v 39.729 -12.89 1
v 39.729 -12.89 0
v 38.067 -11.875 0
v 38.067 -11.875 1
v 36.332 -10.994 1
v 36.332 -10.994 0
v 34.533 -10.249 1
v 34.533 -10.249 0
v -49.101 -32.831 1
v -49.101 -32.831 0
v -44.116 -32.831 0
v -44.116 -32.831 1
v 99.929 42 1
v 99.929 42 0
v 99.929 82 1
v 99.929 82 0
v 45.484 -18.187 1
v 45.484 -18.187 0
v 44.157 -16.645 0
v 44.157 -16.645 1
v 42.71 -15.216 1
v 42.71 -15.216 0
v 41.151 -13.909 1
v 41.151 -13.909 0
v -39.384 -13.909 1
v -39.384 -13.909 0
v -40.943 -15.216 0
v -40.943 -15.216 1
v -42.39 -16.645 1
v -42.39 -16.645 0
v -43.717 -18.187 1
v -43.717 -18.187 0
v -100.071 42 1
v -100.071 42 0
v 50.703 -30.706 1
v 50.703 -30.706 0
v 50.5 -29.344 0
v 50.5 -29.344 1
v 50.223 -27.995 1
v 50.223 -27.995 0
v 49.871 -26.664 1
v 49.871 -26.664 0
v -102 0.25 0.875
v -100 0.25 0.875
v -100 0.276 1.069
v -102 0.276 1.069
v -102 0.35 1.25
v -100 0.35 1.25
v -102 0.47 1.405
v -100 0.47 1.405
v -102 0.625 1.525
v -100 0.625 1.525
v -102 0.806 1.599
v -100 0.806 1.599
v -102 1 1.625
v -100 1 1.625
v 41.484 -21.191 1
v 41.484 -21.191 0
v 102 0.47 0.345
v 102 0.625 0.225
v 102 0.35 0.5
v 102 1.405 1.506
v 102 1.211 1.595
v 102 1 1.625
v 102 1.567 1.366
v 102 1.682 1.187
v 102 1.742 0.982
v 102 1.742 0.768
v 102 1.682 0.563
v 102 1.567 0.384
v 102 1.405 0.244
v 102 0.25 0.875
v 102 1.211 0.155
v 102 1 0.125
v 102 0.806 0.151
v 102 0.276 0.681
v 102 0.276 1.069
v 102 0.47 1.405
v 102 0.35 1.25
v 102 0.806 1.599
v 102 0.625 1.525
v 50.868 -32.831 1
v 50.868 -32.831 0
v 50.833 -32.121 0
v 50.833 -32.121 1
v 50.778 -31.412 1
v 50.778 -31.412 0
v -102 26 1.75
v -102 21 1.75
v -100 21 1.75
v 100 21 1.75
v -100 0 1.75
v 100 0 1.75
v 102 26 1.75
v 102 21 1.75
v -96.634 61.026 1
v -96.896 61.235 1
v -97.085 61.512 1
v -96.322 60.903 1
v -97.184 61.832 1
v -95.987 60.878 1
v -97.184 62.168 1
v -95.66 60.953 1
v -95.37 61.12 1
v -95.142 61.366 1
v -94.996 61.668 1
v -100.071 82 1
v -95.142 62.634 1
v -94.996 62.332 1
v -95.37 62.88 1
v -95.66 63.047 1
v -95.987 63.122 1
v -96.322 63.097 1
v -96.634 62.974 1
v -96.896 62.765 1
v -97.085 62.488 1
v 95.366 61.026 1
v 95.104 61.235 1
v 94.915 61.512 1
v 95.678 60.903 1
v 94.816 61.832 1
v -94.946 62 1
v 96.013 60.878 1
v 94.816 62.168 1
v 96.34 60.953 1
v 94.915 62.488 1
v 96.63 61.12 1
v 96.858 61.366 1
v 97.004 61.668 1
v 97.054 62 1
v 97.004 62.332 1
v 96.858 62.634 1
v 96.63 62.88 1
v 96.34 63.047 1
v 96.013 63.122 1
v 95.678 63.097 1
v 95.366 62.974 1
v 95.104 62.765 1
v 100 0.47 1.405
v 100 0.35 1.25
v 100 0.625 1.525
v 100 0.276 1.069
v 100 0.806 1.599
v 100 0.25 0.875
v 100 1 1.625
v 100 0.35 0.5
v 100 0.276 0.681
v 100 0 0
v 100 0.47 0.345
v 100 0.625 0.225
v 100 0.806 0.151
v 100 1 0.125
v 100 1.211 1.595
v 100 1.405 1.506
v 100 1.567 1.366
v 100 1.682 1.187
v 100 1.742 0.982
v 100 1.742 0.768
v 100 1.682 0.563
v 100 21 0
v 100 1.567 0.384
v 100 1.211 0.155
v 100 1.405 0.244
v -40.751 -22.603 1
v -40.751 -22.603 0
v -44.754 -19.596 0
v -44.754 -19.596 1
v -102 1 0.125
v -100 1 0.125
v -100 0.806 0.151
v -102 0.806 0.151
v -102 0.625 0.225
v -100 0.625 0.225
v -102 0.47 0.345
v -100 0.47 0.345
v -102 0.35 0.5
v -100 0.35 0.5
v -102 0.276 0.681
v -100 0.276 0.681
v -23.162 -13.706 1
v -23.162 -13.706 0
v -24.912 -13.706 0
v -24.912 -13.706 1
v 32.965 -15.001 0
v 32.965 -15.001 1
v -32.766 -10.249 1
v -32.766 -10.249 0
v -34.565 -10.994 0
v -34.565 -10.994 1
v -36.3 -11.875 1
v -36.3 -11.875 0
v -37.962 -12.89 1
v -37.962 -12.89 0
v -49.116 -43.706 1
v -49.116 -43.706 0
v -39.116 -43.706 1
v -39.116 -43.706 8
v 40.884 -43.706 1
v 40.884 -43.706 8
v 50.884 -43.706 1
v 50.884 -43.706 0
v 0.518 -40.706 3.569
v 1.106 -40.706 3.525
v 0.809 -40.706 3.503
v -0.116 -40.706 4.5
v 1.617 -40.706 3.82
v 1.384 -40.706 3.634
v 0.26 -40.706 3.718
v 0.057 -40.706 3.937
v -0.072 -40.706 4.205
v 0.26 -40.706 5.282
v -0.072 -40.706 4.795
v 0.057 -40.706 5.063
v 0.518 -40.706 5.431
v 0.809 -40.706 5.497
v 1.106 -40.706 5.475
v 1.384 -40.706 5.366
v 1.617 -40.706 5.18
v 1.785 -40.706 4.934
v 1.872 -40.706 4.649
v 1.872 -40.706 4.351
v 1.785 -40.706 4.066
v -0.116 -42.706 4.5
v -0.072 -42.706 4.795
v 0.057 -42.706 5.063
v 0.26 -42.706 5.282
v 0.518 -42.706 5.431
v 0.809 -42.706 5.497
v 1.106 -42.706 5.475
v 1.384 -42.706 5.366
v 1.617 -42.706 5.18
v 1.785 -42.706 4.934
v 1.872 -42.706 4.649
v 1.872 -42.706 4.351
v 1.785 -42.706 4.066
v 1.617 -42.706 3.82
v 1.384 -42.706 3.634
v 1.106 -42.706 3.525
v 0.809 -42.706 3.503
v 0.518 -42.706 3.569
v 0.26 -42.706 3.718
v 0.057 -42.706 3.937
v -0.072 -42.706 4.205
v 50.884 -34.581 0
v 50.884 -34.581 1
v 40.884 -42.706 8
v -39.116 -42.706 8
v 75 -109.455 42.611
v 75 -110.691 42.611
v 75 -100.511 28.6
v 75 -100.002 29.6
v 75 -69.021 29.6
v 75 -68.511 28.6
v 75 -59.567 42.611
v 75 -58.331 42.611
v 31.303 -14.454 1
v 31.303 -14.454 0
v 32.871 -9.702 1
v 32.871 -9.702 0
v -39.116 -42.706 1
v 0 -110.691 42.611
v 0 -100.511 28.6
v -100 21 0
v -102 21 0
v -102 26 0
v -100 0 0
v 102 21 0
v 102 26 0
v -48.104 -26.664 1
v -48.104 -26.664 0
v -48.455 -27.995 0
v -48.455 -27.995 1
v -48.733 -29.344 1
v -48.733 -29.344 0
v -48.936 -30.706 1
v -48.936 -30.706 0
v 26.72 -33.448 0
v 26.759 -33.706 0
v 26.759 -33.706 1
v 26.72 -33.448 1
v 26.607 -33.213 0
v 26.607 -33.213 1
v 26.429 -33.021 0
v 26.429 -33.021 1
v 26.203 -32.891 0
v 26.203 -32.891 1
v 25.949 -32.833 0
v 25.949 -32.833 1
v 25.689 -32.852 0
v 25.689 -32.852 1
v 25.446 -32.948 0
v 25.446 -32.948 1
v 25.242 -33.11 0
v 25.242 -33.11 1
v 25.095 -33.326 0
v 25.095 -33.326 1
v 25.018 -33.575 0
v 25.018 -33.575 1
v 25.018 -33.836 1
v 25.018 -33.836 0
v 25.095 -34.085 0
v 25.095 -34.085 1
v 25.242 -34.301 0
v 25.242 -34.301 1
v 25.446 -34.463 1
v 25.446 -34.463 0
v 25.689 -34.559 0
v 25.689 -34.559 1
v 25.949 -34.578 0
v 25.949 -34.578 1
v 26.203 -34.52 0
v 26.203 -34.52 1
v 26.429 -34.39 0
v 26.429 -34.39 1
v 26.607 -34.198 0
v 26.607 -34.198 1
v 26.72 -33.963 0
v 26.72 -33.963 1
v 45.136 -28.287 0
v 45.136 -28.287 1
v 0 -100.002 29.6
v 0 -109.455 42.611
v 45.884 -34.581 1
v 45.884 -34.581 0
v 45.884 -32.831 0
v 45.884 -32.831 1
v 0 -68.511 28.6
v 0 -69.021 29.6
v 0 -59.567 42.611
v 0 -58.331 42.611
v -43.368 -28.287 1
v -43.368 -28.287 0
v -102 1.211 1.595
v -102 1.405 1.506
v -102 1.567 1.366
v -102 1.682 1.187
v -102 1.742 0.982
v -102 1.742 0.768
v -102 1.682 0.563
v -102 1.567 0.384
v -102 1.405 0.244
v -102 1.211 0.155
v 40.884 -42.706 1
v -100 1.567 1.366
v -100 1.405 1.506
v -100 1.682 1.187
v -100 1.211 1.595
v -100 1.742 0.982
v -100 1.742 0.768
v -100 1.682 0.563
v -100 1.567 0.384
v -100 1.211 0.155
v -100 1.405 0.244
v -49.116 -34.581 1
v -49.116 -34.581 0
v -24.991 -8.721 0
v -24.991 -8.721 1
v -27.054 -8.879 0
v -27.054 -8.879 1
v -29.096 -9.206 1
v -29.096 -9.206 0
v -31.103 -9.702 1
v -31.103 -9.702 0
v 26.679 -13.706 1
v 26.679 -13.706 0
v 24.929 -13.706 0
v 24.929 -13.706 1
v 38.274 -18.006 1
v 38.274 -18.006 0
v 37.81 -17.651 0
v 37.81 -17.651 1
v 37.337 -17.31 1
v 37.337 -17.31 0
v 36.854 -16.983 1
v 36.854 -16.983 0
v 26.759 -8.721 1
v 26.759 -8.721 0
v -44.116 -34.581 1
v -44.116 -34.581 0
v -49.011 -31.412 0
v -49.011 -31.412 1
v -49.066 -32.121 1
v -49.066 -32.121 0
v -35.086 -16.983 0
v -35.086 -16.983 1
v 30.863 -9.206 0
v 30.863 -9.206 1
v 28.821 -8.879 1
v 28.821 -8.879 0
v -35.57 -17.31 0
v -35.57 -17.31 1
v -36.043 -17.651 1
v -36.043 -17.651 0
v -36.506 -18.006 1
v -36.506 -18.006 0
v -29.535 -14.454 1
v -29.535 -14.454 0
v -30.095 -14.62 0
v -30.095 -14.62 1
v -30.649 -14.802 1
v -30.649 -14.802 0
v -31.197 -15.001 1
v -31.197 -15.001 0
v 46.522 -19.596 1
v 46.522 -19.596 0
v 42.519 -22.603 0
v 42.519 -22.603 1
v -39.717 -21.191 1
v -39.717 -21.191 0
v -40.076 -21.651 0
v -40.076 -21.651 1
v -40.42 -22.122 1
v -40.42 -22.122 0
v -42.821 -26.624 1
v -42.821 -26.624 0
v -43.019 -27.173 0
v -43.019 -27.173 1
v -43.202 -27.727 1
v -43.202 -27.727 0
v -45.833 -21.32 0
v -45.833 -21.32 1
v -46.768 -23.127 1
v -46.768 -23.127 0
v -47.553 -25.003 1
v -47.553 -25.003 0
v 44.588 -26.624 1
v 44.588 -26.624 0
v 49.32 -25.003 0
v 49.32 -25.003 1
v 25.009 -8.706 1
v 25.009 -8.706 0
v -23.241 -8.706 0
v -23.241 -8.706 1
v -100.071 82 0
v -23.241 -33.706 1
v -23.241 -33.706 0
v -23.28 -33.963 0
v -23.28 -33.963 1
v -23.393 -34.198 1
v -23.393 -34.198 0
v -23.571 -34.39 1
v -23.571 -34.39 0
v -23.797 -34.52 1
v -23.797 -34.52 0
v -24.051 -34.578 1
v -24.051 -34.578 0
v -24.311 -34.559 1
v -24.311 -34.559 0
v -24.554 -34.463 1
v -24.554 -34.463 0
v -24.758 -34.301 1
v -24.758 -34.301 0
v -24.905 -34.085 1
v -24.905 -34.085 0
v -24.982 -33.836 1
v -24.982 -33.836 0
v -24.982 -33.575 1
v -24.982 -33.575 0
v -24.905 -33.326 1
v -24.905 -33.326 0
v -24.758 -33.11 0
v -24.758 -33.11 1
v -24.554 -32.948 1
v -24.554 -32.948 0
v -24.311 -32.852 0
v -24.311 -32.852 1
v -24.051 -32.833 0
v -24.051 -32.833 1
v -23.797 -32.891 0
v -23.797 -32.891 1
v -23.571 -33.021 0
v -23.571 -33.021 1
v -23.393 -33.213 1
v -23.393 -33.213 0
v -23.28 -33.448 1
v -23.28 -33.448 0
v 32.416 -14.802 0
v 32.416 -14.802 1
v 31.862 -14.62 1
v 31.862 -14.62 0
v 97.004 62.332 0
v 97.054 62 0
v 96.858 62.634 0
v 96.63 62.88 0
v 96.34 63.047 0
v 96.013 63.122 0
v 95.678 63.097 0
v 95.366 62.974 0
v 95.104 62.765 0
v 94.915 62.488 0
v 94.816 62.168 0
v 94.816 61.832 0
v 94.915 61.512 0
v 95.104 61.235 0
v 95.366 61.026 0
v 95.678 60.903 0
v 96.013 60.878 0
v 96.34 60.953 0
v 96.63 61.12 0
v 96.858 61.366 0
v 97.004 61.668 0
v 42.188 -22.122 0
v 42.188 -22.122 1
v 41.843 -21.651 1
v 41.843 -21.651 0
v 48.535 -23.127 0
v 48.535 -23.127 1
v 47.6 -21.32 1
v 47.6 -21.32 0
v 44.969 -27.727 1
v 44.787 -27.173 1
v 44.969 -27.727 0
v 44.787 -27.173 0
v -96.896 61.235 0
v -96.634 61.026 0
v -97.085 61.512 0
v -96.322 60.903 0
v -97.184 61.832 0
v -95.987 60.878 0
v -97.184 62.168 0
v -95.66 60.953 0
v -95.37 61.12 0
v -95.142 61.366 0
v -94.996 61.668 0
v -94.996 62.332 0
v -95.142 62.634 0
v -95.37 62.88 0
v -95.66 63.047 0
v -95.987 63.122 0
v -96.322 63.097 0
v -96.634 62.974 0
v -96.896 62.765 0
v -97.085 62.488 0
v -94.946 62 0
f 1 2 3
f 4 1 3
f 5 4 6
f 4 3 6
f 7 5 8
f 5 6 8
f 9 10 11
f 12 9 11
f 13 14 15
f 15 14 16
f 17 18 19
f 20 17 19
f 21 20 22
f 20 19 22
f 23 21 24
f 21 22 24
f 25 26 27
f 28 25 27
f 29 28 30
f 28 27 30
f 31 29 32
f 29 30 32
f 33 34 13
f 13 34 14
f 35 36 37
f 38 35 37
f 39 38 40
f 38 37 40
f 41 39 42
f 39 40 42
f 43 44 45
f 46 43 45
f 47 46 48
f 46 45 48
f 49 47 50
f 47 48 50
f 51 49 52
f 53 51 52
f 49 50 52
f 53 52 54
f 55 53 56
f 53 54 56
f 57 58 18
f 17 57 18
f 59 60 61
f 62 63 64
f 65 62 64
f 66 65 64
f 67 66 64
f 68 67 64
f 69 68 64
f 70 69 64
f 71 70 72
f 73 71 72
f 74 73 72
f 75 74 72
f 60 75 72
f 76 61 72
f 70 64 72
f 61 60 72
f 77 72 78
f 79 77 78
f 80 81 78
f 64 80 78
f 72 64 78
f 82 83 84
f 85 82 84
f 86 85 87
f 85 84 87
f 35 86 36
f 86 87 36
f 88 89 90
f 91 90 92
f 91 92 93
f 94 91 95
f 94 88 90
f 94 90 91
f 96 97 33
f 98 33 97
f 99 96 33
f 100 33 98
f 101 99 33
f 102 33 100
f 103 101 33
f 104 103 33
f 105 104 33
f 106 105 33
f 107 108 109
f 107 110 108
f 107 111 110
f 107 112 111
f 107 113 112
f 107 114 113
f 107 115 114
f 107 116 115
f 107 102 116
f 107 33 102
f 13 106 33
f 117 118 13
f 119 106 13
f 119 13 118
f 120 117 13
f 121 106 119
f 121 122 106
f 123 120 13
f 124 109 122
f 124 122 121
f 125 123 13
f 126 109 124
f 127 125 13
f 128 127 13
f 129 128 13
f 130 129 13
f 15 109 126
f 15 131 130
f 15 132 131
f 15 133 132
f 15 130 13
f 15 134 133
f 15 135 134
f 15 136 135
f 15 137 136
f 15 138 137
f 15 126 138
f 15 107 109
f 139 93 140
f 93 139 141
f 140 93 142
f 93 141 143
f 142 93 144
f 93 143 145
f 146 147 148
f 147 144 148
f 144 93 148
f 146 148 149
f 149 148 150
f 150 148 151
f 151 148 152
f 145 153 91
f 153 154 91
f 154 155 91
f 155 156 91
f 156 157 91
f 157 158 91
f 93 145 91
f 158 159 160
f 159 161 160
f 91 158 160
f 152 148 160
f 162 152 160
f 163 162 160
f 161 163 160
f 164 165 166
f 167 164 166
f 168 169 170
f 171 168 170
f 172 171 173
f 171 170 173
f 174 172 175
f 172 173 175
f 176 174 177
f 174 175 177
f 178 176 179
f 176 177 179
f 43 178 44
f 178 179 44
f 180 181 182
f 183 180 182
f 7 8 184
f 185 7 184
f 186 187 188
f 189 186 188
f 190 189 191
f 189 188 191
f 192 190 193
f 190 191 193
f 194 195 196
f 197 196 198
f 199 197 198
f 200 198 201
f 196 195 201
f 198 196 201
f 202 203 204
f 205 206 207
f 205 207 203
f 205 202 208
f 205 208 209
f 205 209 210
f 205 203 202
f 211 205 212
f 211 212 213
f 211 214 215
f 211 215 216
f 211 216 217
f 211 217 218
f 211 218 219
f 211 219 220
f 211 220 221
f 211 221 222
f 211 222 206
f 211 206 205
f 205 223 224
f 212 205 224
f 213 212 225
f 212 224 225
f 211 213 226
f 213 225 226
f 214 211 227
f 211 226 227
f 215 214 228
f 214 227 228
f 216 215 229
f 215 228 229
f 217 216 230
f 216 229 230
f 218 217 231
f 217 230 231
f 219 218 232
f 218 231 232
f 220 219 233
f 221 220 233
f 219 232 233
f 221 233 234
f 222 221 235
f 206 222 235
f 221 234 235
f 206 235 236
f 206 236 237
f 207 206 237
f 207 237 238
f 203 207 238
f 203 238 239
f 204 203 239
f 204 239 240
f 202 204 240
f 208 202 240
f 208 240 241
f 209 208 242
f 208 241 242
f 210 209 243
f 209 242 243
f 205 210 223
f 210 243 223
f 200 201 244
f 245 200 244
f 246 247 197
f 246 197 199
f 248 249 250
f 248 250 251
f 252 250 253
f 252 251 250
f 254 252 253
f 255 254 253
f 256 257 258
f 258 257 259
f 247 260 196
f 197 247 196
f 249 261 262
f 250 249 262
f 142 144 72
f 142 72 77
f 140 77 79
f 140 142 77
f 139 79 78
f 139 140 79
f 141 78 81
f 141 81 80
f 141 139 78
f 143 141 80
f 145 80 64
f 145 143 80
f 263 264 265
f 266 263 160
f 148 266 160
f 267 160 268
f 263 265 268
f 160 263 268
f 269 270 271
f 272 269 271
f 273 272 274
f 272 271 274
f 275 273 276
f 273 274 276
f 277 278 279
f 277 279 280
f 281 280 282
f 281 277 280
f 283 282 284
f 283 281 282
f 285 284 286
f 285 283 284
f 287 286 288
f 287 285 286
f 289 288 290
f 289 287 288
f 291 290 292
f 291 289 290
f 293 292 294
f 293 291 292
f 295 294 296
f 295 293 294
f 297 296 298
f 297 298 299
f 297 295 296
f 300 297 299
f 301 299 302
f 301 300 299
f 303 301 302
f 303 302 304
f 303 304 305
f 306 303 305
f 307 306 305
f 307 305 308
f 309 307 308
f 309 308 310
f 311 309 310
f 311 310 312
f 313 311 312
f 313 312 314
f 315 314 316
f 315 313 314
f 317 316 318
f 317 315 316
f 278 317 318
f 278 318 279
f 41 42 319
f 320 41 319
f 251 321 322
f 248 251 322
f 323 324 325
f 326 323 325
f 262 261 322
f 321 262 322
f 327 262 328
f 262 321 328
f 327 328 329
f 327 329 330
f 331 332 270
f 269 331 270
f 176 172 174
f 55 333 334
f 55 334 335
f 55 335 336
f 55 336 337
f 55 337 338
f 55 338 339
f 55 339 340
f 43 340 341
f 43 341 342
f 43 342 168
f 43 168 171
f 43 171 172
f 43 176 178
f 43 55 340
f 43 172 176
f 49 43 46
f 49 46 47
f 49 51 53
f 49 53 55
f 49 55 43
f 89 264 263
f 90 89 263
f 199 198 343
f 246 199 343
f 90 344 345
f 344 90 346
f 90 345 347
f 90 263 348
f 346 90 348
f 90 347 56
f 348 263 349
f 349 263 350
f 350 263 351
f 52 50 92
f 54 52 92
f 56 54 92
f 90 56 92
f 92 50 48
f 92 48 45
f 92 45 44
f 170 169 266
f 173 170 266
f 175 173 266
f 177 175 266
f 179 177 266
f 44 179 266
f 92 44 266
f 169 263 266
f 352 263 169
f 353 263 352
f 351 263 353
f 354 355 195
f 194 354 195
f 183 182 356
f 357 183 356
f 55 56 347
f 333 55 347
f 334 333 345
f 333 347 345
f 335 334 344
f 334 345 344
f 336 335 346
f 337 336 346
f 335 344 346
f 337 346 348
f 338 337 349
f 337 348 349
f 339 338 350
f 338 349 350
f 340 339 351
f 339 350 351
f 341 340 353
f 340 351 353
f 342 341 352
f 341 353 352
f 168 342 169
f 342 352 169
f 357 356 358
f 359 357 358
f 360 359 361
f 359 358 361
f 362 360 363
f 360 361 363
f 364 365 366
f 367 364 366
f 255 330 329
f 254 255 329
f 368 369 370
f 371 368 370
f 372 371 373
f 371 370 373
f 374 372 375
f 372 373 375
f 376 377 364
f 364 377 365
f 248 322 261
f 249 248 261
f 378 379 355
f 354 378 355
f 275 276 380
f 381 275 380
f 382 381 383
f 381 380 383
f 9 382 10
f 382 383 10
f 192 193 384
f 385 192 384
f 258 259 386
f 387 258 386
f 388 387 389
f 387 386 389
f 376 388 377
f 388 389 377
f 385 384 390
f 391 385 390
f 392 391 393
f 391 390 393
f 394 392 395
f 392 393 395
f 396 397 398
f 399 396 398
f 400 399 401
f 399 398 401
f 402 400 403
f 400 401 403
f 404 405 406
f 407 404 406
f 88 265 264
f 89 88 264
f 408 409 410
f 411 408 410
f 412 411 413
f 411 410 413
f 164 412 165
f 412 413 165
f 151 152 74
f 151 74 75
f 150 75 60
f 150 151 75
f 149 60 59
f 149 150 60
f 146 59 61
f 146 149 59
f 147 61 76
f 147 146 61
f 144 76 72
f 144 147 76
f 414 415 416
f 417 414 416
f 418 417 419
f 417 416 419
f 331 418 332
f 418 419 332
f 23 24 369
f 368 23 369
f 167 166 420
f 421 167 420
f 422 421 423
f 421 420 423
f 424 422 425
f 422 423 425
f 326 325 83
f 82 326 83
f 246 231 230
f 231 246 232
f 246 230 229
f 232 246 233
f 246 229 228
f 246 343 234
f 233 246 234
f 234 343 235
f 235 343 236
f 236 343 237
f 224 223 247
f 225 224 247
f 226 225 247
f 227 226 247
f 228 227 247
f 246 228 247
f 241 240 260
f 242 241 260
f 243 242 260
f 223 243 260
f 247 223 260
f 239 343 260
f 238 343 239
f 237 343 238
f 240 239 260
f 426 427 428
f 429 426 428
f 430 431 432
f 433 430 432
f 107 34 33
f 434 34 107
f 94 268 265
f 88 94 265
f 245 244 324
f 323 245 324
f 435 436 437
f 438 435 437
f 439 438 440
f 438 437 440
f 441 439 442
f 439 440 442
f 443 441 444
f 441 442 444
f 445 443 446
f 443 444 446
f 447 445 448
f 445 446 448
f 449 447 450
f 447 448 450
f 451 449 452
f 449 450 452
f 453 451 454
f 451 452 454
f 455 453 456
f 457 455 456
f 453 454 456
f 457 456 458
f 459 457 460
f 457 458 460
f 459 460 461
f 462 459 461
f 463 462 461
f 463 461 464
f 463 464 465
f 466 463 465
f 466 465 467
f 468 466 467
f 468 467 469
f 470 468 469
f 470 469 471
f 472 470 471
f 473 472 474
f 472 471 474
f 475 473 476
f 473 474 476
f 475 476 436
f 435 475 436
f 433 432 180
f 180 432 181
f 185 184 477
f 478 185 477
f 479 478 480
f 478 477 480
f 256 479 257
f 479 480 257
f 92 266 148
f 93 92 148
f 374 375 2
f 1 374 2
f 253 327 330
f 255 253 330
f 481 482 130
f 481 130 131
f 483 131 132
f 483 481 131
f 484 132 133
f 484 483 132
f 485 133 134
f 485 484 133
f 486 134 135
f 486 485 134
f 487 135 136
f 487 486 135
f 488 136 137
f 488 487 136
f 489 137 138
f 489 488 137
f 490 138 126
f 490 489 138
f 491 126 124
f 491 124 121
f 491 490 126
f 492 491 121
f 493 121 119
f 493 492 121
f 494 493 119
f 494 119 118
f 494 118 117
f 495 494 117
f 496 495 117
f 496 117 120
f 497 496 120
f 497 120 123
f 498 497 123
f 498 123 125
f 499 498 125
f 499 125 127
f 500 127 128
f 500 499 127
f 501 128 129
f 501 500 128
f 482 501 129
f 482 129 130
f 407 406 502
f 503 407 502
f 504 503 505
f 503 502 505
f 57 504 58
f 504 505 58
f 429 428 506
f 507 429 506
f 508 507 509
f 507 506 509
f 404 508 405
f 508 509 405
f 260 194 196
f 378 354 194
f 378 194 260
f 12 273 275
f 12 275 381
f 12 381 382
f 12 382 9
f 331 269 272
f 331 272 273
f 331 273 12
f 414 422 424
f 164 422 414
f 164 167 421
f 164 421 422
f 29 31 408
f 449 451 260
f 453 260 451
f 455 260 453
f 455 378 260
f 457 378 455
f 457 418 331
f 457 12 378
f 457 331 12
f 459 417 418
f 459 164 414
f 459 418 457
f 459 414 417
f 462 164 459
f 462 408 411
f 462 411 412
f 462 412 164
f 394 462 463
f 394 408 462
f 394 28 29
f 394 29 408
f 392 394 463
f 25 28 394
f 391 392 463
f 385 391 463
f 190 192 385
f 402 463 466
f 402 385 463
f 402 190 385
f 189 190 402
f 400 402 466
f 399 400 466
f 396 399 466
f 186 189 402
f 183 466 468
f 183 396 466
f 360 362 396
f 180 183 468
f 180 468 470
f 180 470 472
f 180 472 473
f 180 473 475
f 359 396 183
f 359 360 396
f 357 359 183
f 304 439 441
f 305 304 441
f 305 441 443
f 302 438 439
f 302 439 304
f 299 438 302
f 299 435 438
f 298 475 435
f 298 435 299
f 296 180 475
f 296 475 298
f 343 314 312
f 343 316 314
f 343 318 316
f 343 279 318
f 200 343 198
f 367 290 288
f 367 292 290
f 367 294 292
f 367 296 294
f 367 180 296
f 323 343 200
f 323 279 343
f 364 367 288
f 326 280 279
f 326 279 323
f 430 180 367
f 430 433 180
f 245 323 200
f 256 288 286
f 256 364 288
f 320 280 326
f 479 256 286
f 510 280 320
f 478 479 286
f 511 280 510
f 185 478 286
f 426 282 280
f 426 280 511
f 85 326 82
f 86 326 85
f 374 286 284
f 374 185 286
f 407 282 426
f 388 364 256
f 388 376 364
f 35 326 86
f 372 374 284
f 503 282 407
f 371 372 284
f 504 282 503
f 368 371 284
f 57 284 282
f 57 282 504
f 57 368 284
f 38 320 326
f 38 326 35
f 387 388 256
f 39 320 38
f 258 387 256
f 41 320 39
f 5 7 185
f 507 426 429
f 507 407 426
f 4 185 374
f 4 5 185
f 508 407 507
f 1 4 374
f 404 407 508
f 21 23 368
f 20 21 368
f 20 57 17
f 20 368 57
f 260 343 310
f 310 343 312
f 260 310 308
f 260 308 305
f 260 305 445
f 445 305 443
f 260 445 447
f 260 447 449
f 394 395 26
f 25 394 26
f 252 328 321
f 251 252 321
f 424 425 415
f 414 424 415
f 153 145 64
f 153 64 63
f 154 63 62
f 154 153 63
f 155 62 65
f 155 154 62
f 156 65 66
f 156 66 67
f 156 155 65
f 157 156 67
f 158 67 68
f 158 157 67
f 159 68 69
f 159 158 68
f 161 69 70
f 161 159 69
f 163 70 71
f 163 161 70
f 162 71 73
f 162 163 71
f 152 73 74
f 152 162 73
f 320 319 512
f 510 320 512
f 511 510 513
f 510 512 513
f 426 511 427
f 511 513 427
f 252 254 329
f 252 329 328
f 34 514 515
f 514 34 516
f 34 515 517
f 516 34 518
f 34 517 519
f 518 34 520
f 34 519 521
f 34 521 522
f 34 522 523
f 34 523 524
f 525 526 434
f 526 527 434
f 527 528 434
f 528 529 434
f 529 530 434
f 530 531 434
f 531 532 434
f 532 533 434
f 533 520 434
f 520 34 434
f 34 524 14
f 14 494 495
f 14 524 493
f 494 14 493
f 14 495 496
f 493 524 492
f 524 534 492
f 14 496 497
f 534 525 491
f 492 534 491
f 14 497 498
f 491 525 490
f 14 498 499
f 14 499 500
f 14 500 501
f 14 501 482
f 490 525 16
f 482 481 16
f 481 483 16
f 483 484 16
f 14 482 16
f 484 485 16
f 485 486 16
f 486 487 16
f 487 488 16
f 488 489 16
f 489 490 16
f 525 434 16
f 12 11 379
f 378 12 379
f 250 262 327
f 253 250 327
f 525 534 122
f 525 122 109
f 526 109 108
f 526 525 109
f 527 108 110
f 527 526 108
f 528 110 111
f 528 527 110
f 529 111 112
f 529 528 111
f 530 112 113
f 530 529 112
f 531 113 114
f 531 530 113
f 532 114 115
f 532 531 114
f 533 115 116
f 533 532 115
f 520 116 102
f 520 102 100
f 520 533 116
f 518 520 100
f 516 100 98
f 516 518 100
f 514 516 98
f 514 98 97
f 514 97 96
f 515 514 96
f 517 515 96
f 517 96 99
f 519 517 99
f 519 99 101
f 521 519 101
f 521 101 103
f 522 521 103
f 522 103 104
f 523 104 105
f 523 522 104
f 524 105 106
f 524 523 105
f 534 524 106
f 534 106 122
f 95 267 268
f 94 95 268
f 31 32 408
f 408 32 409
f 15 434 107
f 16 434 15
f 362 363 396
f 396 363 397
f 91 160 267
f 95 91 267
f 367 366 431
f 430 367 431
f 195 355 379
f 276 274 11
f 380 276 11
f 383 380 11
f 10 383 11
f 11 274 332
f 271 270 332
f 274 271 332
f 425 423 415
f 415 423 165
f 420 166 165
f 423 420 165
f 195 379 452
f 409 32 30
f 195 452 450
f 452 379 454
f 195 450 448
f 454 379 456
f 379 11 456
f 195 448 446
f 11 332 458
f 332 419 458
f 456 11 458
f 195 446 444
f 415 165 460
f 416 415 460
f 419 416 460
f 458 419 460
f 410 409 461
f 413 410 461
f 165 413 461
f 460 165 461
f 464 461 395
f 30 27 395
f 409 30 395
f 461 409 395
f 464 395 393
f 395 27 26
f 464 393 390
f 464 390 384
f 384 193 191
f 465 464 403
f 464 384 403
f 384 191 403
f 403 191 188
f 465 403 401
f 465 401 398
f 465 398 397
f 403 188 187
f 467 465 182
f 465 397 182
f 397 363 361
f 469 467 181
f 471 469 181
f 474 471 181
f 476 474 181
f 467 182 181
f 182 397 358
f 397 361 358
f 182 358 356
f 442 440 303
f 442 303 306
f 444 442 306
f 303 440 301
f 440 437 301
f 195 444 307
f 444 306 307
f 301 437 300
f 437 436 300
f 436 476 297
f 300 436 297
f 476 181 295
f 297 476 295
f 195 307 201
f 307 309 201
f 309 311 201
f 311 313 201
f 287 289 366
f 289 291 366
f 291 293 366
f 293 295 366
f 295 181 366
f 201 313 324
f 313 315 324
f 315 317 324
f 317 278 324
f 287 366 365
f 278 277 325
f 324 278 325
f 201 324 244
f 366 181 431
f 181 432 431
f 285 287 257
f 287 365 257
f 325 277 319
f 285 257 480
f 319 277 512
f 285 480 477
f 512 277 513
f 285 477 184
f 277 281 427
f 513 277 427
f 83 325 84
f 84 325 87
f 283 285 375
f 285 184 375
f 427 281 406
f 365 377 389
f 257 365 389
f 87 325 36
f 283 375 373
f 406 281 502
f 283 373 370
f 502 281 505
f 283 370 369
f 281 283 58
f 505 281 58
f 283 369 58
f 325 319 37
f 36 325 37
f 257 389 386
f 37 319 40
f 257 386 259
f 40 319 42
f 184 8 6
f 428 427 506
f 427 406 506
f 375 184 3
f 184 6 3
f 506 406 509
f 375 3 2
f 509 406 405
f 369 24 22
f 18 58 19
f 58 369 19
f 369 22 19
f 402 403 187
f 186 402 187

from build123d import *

# Parameters (mm, degrees)
F1_R      = 0.875
F2_DEPTH  = 1
F3_DEPTH  = 1.75
F4_DEPTH  = 8
F5_R      = 1
F6_DEPTH  = 2
F7_W      = 200
F7_H      = 40
F7_R      = 1.125
F8_DEPTH  = 1
F10_DEPTH = 2
F11_DEPTH = 202
F13_DEPTH = 75


with BuildPart() as f2:
    # F1 (on Top) → F2 (new body)
    with BuildSketch(Plane.XY):
        with BuildLine():
            Line((0.8836236666, -30.7055586278), (0.8836236666, -33.7055586278))
            Line((0.8836236666, -33.7055586278), (0.8836236666, -42.7055586278))
            Line((0.8836236666, -42.7055586278), (40.8836236666, -42.7055586278))
            Line((40.8836236666, -42.7055586278), (40.8836236666, -43.7055586278))
            Line((40.8836236666, -43.7055586278), (50.8836236666, -43.7055586278))
            Line((50.8836236666, -43.7055586278), (50.8836236666, -34.5805586278))
            Line((50.8836236666, -34.5805586278), (45.8836236666, -34.5805586278))
            Line((45.8836236666, -34.5805586278), (45.8836236666, -32.8305586278))
            Line((45.8836236666, -32.8305586278), (50.8683064743, -32.8305586278))
            ThreePointArc((50.8683064743, -32.8305586278), (50.8082953754, -31.7662958277), (50.7029709586, -30.7055586278))
            Line((50.7029709586, -30.7055586278), (25.8836236666, -30.7055586278))
            Line((25.8836236666, -30.7055586278), (20.8836236666, -30.7055586278))
            Line((20.8836236666, -30.7055586278), (0.8836236666, -30.7055586278))
        make_face()
        with Locations((25.8836236666, -33.7055586278)):
            Circle(F1_R, mode=Mode.SUBTRACT)
        with BuildLine():
            Line((-9.8663763334, -33.7055586278), (0.8836236666, -33.7055586278))
            Line((0.8836236666, -33.7055586278), (0.8836236666, -30.7055586278))
            Line((0.8836236666, -30.7055586278), (-19.1163763334, -30.7055586278))
            Line((-19.1163763334, -30.7055586278), (-24.1163763334, -30.7055586278))
            Line((-24.1163763334, -30.7055586278), (-48.9357236254, -30.7055586278))
            ThreePointArc((-48.9357236254, -30.7055586278), (-49.0410480422, -31.7662958277), (-49.1010591411, -32.8305586278))
            Line((-49.1010591411, -32.8305586278), (-44.1163763334, -32.8305586278))
            Line((-44.1163763334, -32.8305586278), (-44.1163763334, -33.7055586278))
            Line((-44.1163763334, -33.7055586278), (-24.9913763334, -33.7055586278))
            ThreePointArc((-24.9913763334, -33.7055586278), (-24.1163763334, -32.8305586278), (-23.2413763334, -33.7055586278))
            Line((-23.2413763334, -33.7055586278), (-9.8663763334, -33.7055586278))
        make_face()
        with BuildLine():
            Line((0.8836236666, -42.7055586278), (0.8836236666, -33.7055586278))
            Line((0.8836236666, -33.7055586278), (-9.8663763334, -33.7055586278))
            Line((-9.8663763334, -33.7055586278), (-23.2413763334, -33.7055586278))
            ThreePointArc((-23.2413763334, -33.7055586278), (-24.1163763334, -34.5805586278), (-24.9913763334, -33.7055586278))
            Line((-24.9913763334, -33.7055586278), (-44.1163763334, -33.7055586278))
            Line((-44.1163763334, -33.7055586278), (-44.1163763334, -34.5805586278))
            Line((-44.1163763334, -34.5805586278), (-49.1163763334, -34.5805586278))
            Line((-49.1163763334, -34.5805586278), (-49.1163763334, -43.7055586278))
            Line((-49.1163763334, -43.7055586278), (-39.1163763334, -43.7055586278))
            Line((-39.1163763334, -43.7055586278), (-39.1163763334, -42.7055586278))
            Line((-39.1163763334, -42.7055586278), (0.8836236666, -42.7055586278))
        make_face()
        with BuildLine():
            Line((-19.1163763334, -30.7055586278), (0.8836236666, -30.7055586278))
            Line((0.8836236666, -30.7055586278), (0.8836236666, -8.7055586278))
            Line((0.8836236666, -8.7055586278), (-23.2413763334, -8.7055586278))
            Line((-23.2413763334, -8.7055586278), (-23.1618389561, -13.7055586278))
            Line((-23.1618389561, -13.7055586278), (-24.1163763334, -13.7055586278))
            Line((-24.1163763334, -13.7055586278), (-24.912082614, -13.7055586278))
            Line((-24.912082614, -13.7055586278), (-24.9913763334, -8.7208758202))
            ThreePointArc((-24.9913763334, -8.7208758202), (-28.077908395, -9.0214288331), (-31.1034834927, -9.701801973))
            Line((-31.1034834927, -9.701801973), (-29.5353038107, -14.4536697596))
            ThreePointArc((-29.5353038107, -14.4536697596), (-30.3723855414, -14.7091813735), (-31.1974871395, -15.0010706704))
            Line((-31.1974871395, -15.0010706704), (-32.7655987712, -10.2494090883))
            ThreePointArc((-32.7655987712, -10.2494090883), (-35.440866625, -11.4175367409), (-37.9617303934, -12.8895510627))
            Line((-37.9617303934, -12.8895510627), (-35.0863486412, -16.9825293698))
            ThreePointArc((-35.0863486412, -16.9825293698), (-35.8075280429, -17.4785141741), (-36.5063159472, -18.0055778519))
            Line((-36.5063159472, -18.0055778519), (-39.3841000729, -13.9091798727))
            ThreePointArc((-39.3841000729, -13.9091798727), (-41.6810511869, -15.9156121048), (-43.7165906252, -18.1868086874))
            Line((-43.7165906252, -18.1868086874), (-39.7171402185, -21.1909205507))
            ThreePointArc((-39.7171402185, -21.1909205507), (-40.2497548544, -21.8854868219), (-40.7514700108, -22.6026915051))
            Line((-40.7514700108, -22.6026915051), (-44.7542619472, -19.5960697147))
            ThreePointArc((-44.7542619472, -19.5960697147), (-46.318770614, -22.214097093), (-47.5528453195, -25.0031496818))
            Line((-47.5528453195, -25.0031496818), (-42.8208203298, -26.6243317012))
            ThreePointArc((-42.8208203298, -26.6243317012), (-43.1127341685, -27.4494904535), (-43.3682652017, -28.2866311505))
            Line((-43.3682652017, -28.2866311505), (-48.1042437851, -26.664094638))
            ThreePointArc((-48.1042437851, -26.664094638), (-48.6035037794, -28.6676434394), (-48.9357236254, -30.7055586278))
            Line((-48.9357236254, -30.7055586278), (-24.1163763334, -30.7055586278))
            Line((-24.1163763334, -30.7055586278), (-19.1163763334, -30.7055586278))
        make_face()
        with BuildLine():
            Line((0.8836236666, -8.7055586278), (0.8836236666, -30.7055586278))
            Line((0.8836236666, -30.7055586278), (20.8836236666, -30.7055586278))
            Line((20.8836236666, -30.7055586278), (25.8836236666, -30.7055586278))
            Line((25.8836236666, -30.7055586278), (50.7029709586, -30.7055586278))
            ThreePointArc((50.7029709586, -30.7055586278), (50.3707511125, -28.6676434394), (49.8714911183, -26.664094638))
            Line((49.8714911183, -26.664094638), (45.1355125348, -28.2866311505))
            ThreePointArc((45.1355125348, -28.2866311505), (44.8799815016, -27.4494904535), (44.588067663, -26.6243317012))
            Line((44.588067663, -26.6243317012), (49.3200926527, -25.0031496818))
            ThreePointArc((49.3200926527, -25.0031496818), (48.0860179472, -22.214097093), (46.5215092804, -19.5960697147))
            Line((46.5215092804, -19.5960697147), (42.518717344, -22.6026915051))
            ThreePointArc((42.518717344, -22.6026915051), (42.0170021876, -21.8854868219), (41.4843875517, -21.1909205507))
            Line((41.4843875517, -21.1909205507), (45.4838379584, -18.1868086874))
            ThreePointArc((45.4838379584, -18.1868086874), (43.4482985201, -15.9156121048), (41.1513474061, -13.9091798727))
            Line((41.1513474061, -13.9091798727), (38.2735632804, -18.0055778519))
            ThreePointArc((38.2735632804, -18.0055778519), (37.5747753761, -17.4785141741), (36.8535959744, -16.9825293698))
            Line((36.8535959744, -16.9825293698), (39.7289777266, -12.8895510627))
            ThreePointArc((39.7289777266, -12.8895510627), (37.2081139582, -11.4175367409), (34.5328461044, -10.2494090883))
            Line((34.5328461044, -10.2494090883), (32.9647344727, -15.0010706704))
            ThreePointArc((32.9647344727, -15.0010706704), (32.1396328746, -14.7091813735), (31.3025511439, -14.4536697596))
            Line((31.3025511439, -14.4536697596), (32.8707308259, -9.701801973))
            ThreePointArc((32.8707308259, -9.701801973), (29.8451557282, -9.0214288331), (26.7586236666, -8.7208758202))
            Line((26.7586236666, -8.7208758202), (26.6793299472, -13.7055586278))
            Line((26.6793299472, -13.7055586278), (25.8836236666, -13.7055586278))
            Line((25.8836236666, -13.7055586278), (24.9290862893, -13.7055586278))
            Line((24.9290862893, -13.7055586278), (25.0086236666, -8.7055586278))
            Line((25.0086236666, -8.7055586278), (0.8836236666, -8.7055586278))
        make_face()
        Polygon((0.8836236666, -43.7055586278), (0.8836236666, -42.7055586278), (-39.1163763334, -42.7055586278), (-39.1163763334, -43.7055586278), (-9.1163763334, -43.7055586278), align=None)
        Polygon((40.8836236666, -42.7055586278), (0.8836236666, -42.7055586278), (0.8836236666, -43.7055586278), (5.8836236666, -43.7055586278), (10.8836236666, -43.7055586278), (40.8836236666, -43.7055586278), align=None)
    extrude(amount=F2_DEPTH)

    # F1 (on Top) → F4 (join)
    with BuildSketch(Plane.XY):
        Polygon((0.8836236666, -43.7055586278), (0.8836236666, -42.7055586278), (-39.1163763334, -42.7055586278), (-39.1163763334, -43.7055586278), (-9.1163763334, -43.7055586278), align=None)
        Polygon((40.8836236666, -42.7055586278), (0.8836236666, -42.7055586278), (0.8836236666, -43.7055586278), (5.8836236666, -43.7055586278), (10.8836236666, -43.7055586278), (40.8836236666, -43.7055586278), align=None)
    extrude(amount=F4_DEPTH)

    # F5 (on face) → F6 (join)
    with BuildSketch(Plane(origin=(0, -42.7055586278, 0), x_dir=(-1, 0, 0), z_dir=(0, 1, 0))):
        with Locations((-0.8836236666, 4.5)):
            Circle(F5_R)
    extrude(amount=F6_DEPTH)


with BuildPart() as f3:
    # F0 (on Top) → F3 (new body)
    with BuildSketch(Plane.XY):
        Polygon((0, 26), (0, 0), (100, 0), (100, 21), (102, 21), (102, 26), align=None)
        Polygon((-100, 0), (0, 0), (0, 26), (-102, 26), (-102, 21), (-100, 21), align=None)
    extrude(amount=F3_DEPTH)

    # F9 (on face) → F10 (join)
    with BuildSketch(Plane(origin=(-100, 0, 0), x_dir=(0, -1, 0), z_dir=(-1, 0, 0))):
        with BuildLine():
            ThreePointArc((-1, 1.625), (-1.75, 0.875), (-1, 0.125))
            Line((-1, 0.125), (-1, 1.625))
        make_face()
        with BuildLine():
            Line((-1, 1.625), (-1, 0.125))
            ThreePointArc((-1, 0.125), (-0.4696699141, 0.3446699141), (-0.25, 0.875))
            ThreePointArc((-0.25, 0.875), (-0.4696699141, 1.4053300859), (-1, 1.625))
        make_face()
    extrude(amount=F10_DEPTH)

    # F9 (on face) → F11 (join)
    with BuildSketch(Plane(origin=(-100, 0, 0), x_dir=(0, -1, 0), z_dir=(-1, 0, 0))):
        with BuildLine():
            ThreePointArc((-1, 1.625), (-1.75, 0.875), (-1, 0.125))
            Line((-1, 0.125), (-1, 1.625))
        make_face()
        with BuildLine():
            Line((-1, 1.625), (-1, 0.125))
            ThreePointArc((-1, 0.125), (-0.4696699141, 0.3446699141), (-0.25, 0.875))
            ThreePointArc((-0.25, 0.875), (-0.4696699141, 1.4053300859), (-1, 1.625))
        make_face()
    extrude(amount=-F11_DEPTH)


with BuildPart() as f8:
    # F7 (on Top) → F8 (new body)
    with BuildSketch(Plane.XY):
        with Locations((-0.0712359548, 62)):
            Rectangle(F7_W, F7_H)
        with Locations((-96.0712359548, 62)):
            Circle(F7_R, mode=Mode.SUBTRACT)
        with Locations((95.9287640452, 62)):
            Circle(F7_R, mode=Mode.SUBTRACT)
    extrude(amount=F8_DEPTH)


with BuildPart() as f13:
    # F12 (on Right) → F13 (new body)
    with BuildSketch(Plane.YZ):
        Polygon((-100.5110992908, 28.6), (-84.5110992908, 28.6), (-68.5110992908, 28.6), (-58.3313473489, 42.6112265278), (-59.5674153264, 42.6112265278), (-69.0206247403, 29.6), (-84.5110992908, 29.6), (-100.0015738414, 29.6), (-109.4547832553, 42.6112265278), (-110.6908512328, 42.6112265278), align=None)
    extrude(amount=F13_DEPTH)


solid = Compound([f2.part, f3.part, f8.part, f13.part])
